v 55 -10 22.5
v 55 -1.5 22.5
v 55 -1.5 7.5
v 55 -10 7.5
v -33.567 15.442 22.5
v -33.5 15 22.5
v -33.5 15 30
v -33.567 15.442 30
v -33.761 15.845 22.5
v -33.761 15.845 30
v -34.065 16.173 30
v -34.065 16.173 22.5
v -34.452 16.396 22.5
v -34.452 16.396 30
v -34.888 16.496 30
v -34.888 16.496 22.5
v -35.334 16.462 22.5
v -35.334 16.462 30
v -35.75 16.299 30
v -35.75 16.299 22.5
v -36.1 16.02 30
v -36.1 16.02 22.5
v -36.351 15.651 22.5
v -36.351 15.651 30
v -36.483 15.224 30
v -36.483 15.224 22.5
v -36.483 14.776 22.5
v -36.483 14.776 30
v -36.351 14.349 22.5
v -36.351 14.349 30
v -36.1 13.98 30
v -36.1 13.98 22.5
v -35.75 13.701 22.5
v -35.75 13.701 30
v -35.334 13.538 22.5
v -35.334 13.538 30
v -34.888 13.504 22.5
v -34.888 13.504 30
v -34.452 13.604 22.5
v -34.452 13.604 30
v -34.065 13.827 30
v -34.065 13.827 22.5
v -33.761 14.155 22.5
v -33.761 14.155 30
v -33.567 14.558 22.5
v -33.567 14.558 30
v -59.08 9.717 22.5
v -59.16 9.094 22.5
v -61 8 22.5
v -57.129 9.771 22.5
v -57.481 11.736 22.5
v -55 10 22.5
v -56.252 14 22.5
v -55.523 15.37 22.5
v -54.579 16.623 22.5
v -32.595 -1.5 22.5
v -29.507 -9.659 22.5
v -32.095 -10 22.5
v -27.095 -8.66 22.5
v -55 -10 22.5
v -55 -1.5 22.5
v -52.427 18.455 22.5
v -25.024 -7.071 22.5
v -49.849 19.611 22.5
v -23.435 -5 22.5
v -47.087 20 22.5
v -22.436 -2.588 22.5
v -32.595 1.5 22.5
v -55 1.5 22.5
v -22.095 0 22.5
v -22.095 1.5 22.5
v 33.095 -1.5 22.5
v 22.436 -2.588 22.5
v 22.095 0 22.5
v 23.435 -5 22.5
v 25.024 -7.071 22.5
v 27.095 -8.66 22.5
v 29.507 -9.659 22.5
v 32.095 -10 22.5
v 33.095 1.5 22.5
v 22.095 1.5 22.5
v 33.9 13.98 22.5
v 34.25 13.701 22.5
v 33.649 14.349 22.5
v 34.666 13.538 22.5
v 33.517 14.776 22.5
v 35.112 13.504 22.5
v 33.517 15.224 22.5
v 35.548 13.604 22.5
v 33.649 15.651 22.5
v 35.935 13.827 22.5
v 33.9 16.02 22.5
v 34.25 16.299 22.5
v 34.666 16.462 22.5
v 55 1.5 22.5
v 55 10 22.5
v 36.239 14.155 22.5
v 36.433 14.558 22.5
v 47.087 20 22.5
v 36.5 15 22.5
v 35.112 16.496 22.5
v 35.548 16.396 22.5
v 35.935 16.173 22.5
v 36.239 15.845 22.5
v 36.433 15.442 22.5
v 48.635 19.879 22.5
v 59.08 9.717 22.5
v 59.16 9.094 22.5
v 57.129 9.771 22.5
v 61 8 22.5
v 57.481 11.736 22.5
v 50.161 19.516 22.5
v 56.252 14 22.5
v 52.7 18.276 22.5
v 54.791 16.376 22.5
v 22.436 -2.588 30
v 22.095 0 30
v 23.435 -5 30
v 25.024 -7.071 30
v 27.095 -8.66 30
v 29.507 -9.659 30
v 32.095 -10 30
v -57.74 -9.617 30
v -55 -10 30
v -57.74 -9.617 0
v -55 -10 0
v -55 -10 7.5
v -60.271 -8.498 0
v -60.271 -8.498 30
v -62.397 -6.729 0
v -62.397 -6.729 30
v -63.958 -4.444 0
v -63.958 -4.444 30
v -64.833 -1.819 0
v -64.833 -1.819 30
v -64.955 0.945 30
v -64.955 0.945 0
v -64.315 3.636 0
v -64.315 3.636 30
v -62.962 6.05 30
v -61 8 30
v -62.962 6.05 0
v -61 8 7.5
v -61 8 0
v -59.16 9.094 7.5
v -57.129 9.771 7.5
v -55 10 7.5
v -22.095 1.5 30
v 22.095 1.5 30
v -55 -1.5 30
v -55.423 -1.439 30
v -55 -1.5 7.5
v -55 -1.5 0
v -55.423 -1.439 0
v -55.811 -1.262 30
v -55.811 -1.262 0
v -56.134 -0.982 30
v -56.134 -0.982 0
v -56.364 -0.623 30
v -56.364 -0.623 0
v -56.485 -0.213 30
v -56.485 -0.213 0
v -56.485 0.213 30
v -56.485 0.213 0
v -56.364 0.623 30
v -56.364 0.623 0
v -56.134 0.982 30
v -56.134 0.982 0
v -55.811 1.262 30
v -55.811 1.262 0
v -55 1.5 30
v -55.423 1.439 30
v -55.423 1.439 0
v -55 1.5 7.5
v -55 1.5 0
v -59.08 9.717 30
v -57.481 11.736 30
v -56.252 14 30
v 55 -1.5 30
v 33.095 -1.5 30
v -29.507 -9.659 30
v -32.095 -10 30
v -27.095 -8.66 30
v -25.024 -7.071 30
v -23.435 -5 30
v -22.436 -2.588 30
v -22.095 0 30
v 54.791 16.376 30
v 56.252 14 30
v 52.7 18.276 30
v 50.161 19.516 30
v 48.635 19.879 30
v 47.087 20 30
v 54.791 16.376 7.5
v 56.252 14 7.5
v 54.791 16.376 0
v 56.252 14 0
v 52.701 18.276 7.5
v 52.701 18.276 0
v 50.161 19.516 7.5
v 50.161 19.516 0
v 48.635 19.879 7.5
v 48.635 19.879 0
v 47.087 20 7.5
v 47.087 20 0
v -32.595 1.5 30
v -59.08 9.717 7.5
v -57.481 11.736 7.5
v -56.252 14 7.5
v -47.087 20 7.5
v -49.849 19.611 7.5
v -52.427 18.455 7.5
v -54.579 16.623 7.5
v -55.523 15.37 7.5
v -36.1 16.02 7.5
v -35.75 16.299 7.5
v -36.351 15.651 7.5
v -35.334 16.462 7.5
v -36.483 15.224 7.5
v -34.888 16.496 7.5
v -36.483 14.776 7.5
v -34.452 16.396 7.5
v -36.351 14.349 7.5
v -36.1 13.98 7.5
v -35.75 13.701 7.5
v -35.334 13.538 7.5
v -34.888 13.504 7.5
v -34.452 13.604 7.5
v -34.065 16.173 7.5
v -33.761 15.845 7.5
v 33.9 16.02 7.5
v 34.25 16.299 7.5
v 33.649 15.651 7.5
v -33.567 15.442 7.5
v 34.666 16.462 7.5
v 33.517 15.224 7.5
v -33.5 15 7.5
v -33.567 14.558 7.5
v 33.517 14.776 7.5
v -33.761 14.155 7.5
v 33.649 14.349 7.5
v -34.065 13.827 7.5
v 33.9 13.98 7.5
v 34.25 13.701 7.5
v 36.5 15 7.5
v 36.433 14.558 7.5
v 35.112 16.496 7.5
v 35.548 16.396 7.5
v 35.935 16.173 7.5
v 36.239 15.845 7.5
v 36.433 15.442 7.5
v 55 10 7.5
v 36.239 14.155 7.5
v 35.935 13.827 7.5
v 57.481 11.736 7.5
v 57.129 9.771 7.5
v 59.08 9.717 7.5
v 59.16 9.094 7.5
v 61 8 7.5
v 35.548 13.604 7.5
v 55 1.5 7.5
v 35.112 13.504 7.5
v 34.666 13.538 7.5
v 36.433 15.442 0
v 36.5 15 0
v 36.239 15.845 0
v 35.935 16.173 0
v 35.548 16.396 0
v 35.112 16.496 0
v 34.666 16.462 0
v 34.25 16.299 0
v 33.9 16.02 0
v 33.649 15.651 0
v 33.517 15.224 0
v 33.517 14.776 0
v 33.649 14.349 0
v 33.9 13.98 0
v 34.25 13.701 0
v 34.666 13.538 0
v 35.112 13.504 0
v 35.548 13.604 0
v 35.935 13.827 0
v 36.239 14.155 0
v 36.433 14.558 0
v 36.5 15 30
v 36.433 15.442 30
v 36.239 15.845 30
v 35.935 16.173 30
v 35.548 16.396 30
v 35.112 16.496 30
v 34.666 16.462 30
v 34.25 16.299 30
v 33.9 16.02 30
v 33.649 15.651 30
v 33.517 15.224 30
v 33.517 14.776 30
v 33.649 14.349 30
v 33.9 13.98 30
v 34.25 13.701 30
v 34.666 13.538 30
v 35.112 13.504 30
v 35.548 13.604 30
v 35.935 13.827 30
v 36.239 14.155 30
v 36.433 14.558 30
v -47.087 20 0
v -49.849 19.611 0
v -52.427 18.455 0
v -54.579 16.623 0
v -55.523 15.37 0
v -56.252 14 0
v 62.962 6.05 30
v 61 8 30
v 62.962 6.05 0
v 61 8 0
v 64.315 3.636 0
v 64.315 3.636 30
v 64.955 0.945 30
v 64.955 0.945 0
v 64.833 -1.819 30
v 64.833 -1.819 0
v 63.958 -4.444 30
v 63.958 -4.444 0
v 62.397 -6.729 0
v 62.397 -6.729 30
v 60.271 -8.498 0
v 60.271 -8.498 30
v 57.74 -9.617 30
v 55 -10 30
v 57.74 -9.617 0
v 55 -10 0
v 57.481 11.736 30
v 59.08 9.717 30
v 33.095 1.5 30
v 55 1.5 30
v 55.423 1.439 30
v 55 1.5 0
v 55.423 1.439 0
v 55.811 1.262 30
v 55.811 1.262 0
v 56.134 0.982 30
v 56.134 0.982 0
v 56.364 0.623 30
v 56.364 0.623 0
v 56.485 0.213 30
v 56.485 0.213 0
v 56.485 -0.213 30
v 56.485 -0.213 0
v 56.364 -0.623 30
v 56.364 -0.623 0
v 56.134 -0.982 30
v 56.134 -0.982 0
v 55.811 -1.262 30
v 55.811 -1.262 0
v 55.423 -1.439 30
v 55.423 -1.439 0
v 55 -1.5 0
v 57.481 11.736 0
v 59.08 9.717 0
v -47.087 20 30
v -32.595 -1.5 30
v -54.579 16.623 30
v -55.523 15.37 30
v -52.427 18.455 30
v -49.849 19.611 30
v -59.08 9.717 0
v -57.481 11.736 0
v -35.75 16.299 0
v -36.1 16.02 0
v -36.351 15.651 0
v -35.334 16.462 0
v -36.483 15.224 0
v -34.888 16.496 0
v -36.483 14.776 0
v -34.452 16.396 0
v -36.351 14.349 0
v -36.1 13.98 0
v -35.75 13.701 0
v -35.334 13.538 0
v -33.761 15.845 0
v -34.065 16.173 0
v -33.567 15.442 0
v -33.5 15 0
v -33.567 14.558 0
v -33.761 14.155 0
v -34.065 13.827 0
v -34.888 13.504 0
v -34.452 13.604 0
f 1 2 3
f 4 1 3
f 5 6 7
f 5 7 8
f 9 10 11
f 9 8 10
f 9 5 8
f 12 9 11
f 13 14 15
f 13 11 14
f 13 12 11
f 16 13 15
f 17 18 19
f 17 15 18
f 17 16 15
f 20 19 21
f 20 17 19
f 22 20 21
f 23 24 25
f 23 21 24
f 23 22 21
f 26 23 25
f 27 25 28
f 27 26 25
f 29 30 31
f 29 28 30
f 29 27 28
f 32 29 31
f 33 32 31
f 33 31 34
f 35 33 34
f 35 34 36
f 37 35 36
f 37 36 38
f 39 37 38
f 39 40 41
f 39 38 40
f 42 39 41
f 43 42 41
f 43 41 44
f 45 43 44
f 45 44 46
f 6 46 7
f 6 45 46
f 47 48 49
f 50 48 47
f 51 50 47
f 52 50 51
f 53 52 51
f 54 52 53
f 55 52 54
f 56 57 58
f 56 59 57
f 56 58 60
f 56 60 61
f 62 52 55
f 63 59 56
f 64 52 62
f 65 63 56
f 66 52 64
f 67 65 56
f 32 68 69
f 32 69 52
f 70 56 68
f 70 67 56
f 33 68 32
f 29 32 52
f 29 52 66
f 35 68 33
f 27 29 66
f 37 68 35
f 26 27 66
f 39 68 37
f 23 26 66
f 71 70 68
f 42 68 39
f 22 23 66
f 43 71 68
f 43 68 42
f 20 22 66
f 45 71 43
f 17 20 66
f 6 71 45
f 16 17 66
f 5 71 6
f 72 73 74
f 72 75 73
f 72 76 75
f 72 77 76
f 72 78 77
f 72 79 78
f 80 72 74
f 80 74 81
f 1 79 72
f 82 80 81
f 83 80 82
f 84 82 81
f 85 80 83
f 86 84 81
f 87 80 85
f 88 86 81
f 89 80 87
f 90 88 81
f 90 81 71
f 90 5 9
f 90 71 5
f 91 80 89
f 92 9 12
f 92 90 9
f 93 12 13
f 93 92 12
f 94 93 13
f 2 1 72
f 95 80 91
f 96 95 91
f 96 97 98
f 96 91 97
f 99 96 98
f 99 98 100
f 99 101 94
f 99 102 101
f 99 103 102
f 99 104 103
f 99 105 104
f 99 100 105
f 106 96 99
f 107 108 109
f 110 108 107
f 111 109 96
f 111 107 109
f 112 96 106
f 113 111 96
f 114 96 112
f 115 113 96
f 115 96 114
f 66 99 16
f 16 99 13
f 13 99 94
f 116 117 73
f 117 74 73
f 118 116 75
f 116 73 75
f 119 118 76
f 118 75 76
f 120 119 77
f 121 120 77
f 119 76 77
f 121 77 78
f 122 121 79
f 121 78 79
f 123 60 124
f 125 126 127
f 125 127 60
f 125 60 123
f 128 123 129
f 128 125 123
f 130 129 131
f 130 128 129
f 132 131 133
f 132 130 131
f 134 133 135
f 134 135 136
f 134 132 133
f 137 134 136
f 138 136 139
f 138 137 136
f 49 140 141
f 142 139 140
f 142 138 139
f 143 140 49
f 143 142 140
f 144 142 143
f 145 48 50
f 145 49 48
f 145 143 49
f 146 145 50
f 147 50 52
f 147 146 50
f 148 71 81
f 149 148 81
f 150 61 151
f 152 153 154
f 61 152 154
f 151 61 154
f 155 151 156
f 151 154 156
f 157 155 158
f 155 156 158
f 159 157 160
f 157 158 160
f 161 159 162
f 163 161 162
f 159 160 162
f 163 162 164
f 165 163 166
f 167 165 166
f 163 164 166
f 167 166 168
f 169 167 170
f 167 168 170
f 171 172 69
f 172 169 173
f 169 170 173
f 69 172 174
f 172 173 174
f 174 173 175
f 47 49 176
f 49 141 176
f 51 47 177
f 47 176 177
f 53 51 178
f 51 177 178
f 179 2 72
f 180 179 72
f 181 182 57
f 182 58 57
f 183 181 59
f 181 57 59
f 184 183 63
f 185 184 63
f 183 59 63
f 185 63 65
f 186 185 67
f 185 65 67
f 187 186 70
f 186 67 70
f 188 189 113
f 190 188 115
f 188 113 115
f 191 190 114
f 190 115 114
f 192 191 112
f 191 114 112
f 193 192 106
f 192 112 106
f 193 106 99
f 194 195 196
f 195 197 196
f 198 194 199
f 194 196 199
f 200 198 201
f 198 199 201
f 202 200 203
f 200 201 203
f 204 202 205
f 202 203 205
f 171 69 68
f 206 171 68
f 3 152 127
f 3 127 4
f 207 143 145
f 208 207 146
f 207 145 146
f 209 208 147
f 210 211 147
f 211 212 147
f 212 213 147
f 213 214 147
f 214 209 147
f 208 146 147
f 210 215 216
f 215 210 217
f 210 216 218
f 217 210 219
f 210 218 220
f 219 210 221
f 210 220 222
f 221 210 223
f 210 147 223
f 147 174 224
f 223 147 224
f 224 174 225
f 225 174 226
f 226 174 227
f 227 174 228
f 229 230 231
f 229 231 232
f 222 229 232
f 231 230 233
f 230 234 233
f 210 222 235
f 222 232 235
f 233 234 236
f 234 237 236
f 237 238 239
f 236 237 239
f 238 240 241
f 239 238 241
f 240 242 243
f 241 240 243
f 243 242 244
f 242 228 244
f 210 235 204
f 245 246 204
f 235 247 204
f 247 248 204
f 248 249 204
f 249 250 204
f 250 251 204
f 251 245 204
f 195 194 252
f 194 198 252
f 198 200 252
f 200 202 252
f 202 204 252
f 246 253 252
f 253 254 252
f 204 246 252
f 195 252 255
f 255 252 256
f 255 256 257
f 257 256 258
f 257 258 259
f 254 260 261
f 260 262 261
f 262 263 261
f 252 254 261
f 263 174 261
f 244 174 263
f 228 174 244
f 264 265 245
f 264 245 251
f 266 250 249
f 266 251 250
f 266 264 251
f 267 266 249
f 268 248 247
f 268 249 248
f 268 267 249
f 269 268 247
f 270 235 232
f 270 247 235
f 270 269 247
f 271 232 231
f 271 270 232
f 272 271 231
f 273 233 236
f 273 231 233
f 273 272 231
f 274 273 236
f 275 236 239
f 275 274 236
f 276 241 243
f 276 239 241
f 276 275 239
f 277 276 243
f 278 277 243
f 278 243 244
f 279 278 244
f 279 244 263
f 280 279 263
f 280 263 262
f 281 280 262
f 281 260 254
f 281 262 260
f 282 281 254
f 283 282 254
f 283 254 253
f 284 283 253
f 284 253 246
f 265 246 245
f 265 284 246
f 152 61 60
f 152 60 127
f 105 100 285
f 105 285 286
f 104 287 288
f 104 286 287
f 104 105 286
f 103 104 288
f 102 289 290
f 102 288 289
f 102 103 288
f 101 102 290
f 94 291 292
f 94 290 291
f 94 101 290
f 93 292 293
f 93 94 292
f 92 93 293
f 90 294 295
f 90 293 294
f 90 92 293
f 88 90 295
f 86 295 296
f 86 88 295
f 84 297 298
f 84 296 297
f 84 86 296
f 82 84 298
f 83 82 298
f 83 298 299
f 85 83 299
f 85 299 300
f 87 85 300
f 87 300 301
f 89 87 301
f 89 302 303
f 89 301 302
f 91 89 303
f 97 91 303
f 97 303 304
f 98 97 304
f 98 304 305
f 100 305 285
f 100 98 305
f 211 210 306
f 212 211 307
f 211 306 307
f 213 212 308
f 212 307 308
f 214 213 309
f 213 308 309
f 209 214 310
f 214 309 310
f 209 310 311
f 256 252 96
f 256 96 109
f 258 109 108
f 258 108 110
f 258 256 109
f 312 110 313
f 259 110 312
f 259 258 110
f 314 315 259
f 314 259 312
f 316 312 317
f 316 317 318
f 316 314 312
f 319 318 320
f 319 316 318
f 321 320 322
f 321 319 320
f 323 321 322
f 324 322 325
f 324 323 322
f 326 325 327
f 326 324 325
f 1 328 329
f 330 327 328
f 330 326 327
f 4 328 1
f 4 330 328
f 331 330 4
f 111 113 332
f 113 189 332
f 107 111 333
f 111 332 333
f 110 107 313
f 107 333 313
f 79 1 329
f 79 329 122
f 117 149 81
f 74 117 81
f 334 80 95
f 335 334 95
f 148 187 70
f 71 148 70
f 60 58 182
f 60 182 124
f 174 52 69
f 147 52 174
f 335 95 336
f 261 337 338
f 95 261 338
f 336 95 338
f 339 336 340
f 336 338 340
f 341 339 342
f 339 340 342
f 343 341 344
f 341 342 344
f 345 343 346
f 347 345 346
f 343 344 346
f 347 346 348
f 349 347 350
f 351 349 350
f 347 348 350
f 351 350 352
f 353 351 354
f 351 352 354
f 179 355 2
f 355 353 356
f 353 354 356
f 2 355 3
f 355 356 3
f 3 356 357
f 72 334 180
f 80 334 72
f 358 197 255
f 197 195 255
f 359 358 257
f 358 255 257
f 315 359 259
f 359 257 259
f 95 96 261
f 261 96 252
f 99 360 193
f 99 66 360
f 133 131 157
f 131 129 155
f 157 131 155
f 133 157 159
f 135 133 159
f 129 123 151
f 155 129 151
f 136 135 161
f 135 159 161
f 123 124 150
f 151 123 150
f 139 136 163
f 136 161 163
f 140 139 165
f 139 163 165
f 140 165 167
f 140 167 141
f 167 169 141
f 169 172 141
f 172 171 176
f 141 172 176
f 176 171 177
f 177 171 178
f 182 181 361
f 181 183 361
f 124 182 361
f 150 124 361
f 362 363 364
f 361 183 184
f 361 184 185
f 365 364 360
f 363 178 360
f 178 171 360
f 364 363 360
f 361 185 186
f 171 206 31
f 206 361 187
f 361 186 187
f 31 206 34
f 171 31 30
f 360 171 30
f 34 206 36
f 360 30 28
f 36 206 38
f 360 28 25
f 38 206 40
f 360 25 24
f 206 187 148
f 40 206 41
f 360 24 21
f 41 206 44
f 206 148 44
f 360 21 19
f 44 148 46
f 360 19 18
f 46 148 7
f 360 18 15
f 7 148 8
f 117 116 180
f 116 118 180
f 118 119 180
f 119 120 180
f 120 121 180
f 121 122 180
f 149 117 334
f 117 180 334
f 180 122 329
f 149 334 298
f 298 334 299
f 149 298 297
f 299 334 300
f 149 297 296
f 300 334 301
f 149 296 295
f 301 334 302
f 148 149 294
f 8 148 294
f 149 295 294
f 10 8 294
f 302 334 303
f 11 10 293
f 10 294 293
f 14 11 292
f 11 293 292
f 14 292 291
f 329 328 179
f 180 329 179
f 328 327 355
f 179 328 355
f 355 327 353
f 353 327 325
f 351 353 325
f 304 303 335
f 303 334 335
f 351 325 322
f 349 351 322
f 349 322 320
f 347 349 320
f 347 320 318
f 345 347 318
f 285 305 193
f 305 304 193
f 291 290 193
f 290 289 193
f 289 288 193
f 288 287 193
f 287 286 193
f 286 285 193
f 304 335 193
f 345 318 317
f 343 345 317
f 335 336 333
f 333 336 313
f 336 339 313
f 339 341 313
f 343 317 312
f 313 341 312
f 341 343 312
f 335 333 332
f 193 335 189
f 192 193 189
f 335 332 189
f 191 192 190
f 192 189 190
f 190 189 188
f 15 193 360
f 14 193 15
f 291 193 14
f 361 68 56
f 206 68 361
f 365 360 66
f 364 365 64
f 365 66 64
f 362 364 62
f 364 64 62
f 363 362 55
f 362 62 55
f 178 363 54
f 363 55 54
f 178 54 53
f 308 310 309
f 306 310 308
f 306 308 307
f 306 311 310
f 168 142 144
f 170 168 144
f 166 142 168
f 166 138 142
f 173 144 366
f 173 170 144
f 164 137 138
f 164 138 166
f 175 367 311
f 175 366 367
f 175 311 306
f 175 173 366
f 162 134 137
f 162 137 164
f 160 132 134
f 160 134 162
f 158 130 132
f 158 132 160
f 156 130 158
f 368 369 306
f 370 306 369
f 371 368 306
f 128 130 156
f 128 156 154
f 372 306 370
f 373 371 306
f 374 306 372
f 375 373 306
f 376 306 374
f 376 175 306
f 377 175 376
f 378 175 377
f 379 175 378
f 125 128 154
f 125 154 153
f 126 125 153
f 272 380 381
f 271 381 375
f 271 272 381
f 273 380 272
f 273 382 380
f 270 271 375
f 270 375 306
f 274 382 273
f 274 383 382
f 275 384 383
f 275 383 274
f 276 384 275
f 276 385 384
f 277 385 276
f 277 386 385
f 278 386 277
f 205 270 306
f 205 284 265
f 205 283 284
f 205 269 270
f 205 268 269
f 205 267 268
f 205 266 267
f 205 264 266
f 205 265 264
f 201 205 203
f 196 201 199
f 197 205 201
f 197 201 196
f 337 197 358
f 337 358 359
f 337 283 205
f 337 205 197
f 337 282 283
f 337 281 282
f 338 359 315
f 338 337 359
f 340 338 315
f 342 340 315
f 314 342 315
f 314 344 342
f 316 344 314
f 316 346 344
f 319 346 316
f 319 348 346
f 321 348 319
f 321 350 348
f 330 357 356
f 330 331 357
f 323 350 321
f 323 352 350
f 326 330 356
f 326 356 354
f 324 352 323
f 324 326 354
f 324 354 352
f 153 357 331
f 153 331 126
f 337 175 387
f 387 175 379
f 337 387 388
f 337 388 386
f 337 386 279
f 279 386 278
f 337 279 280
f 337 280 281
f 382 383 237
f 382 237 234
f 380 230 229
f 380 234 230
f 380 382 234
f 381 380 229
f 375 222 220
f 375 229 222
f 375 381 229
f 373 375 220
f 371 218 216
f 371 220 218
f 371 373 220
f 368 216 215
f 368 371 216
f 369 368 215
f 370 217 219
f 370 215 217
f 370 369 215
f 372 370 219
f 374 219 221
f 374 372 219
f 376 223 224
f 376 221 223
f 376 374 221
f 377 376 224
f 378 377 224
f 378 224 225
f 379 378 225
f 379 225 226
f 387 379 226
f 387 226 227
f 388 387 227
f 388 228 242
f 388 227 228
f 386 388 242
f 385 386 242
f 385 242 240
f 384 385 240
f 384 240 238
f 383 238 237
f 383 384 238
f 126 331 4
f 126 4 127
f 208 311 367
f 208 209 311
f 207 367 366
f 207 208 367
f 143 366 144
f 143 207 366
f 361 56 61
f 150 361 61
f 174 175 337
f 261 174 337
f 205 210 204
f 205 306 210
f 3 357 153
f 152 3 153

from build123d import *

# Parameters (mm, degrees)
BOSS_EXTRU_1_DEPTH           = 30
ESQUISSE2_W                  = 110
ESQUISSE2_H                  = 15
ENL_V_MAT_EXTRU_1_DEPTH      = 30
ENL_V_START                  = -10
ESQUISSE3_W                  = 44.19
ESQUISSE3_H                  = 7.5
ENL_V_MAT_EXTRU_2_DEPTH      = 10
ESQUISSE4_W                  = 5
ESQUISSE4_H                  = 7.5
BOSS_EXTRU_2_DEPTH           = 10
ESQUISSE5_W                  = 7.5
ESQUISSE5_H                  = 3
BOSS_EXTRU_3_DEPTH           = 6
ESQUISSE6_W                  = 7.5
ESQUISSE6_H                  = 3
BOSS_EXTRU_4_DEPTH           = 5.5
CONG_1_R                     = 10
ESQUISSE7_W                  = 110
ESQUISSE7_H                  = 7.5
BOSS_EXTRU_5_DEPTH           = 10
ENL_V_MAT_EXTRU_3_DEPTH      = 72.632743909
ENL_V_MAT_EXTRU_3_DEPTH_BACK = 72.632743909
ESQUISSE8_R                  = 1.5
CONG_2_R                     = 15
CONG_3_R                     = 15
CONG_4_R                     = 15
CONG_5_R                     = 15
CONG_6_R                     = 10


with BuildPart() as part:
    # Esquisse1 → Boss.-Extru.1 (new body)
    with BuildSketch(Plane.XY):
        with BuildLine():
            Line((-55, 10), (55, 10))
            ThreePointArc((55, 10), (65, 0), (55, -10))
            Line((55, -10), (-55, -10))
            ThreePointArc((-55, -10), (-65, 0), (-55, 10))
        make_face()
        with BuildLine():
            Line((-55, 1.5), (55, 1.5))
            ThreePointArc((55, 1.5), (56.5, 0), (55, -1.5))
            Line((55, -1.5), (-55, -1.5))
            ThreePointArc((-55, -1.5), (-56.5, 0), (-55, 1.5))
        make_face(mode=Mode.SUBTRACT)
    extrude(amount=BOSS_EXTRU_1_DEPTH)

    # Esquisse2 → Enlèv. mat.-Extru.1 (cut)
    with BuildSketch(Plane(origin=(0, 10, 0), x_dir=(1, 0, 0), z_dir=(0, 1, 0))):
        with Locations((0, -15)):
            Rectangle(ESQUISSE2_W, ESQUISSE2_H)
    extrude(amount=-ENL_V_MAT_EXTRU_1_DEPTH, mode=Mode.SUBTRACT)

    # Esquisse3 → Enlèv. mat.-Extru.2 (cut)
    with BuildSketch(Plane(origin=(0, 10, 0), x_dir=(1, 0, 0), z_dir=(0, 1, 0)).offset(ENL_V_START)):
        with Locations((0, -26.25)):
            Rectangle(ESQUISSE3_W, ESQUISSE3_H)
    extrude(amount=-ENL_V_MAT_EXTRU_2_DEPTH, mode=Mode.SUBTRACT)

    # Esquisse4 → Boss.-Extru.2 (add)
    with BuildSketch(Plane(origin=(0, -1.5, 0), x_dir=(1, 0, 0), z_dir=(0, 1, 0))):
        with Locations((-24.595, -26.25)):
            Rectangle(ESQUISSE4_W, ESQUISSE4_H)
        with Locations((24.595, -26.25)):
            Rectangle(ESQUISSE4_W, ESQUISSE4_H)
    extrude(amount=BOSS_EXTRU_2_DEPTH)

    # Esquisse5 → Boss.-Extru.3 (add)
    with BuildSketch(Plane(origin=(27.095, 0, 0), x_dir=(0, 0, -1), z_dir=(1, 0, 0))):
        with Locations((-26.25, 0)):
            Rectangle(ESQUISSE5_W, ESQUISSE5_H)
    extrude(amount=BOSS_EXTRU_3_DEPTH)

    # Esquisse6 → Boss.-Extru.4 (add)
    with BuildSketch(Plane.ZY.offset(27.095)):
        with Locations((26.25, 0)):
            Rectangle(ESQUISSE6_W, ESQUISSE6_H)
    extrude(amount=BOSS_EXTRU_4_DEPTH)

    # Congé1
    cong_1_edges = [part.edges().sort_by_distance(p)[0] for p in [
        (22.095, -10, 26.25),
        (-22.095, -10, 26.25),
    ]]
    fillet(cong_1_edges, radius=CONG_1_R)

    # Esquisse7 → Boss.-Extru.5 (add)
    with BuildSketch(Plane(origin=(0, 10, 0), x_dir=(1, 0, 0), z_dir=(0, 1, 0))):
        with Locations((0, -3.75)):
            Rectangle(ESQUISSE7_W, ESQUISSE7_H)
        with Locations((0, -26.25)):
            Rectangle(ESQUISSE7_W, ESQUISSE7_H)
    extrude(amount=BOSS_EXTRU_5_DEPTH)

    # Esquisse8 → Enlèv. mat.-Extru.3 (cut, two sides: drawn at the far end of the back side and taken through both)
    with BuildSketch(Plane.XY.offset(7.5).offset(-ENL_V_MAT_EXTRU_3_DEPTH_BACK)):
        with Locations((-35, 15)):
            Circle(ESQUISSE8_R)
        with Locations((35, 15)):
            Circle(ESQUISSE8_R)
    extrude(amount=ENL_V_MAT_EXTRU_3_DEPTH + ENL_V_MAT_EXTRU_3_DEPTH_BACK, mode=Mode.SUBTRACT)

    # Congé2
    cong_2_edges = [part.edges().sort_by_distance(p)[0] for p in [
        (-55, 10, 3.75),
    ]]
    fillet(cong_2_edges, radius=CONG_2_R - 0.0001)  # a hair under: the kernel refuses the full size

    # Congé3
    cong_3_edges = [part.edges().sort_by_distance(p)[0] for p in [
        (55, 10, 3.75),
    ]]
    fillet(cong_3_edges, radius=CONG_3_R - 0.0001)  # a hair under: the kernel refuses the full size

    # Congé4
    cong_4_edges = [part.edges().sort_by_distance(p)[0] for p in [
        (-55, 10, 26.25),
    ]]
    fillet(cong_4_edges, radius=CONG_4_R - 0.0001)  # a hair under: the kernel refuses the full size

    # Congé5
    cong_5_edges = [part.edges().sort_by_distance(p)[0] for p in [
        (55, 10, 26.25),
    ]]
    fillet(cong_5_edges, radius=CONG_5_R - 0.0001)  # a hair under: the kernel refuses the full size

    # Congé6
    cong_6_edges = [part.edges().sort_by_distance(p)[0] for p in [
        (-55, 20, 3.75),
        (55, 20, 3.75),
        (55, 20, 26.25),
        (-55, 20, 26.25),
    ]]
    fillet(cong_6_edges, radius=CONG_6_R)


solid = part.part
